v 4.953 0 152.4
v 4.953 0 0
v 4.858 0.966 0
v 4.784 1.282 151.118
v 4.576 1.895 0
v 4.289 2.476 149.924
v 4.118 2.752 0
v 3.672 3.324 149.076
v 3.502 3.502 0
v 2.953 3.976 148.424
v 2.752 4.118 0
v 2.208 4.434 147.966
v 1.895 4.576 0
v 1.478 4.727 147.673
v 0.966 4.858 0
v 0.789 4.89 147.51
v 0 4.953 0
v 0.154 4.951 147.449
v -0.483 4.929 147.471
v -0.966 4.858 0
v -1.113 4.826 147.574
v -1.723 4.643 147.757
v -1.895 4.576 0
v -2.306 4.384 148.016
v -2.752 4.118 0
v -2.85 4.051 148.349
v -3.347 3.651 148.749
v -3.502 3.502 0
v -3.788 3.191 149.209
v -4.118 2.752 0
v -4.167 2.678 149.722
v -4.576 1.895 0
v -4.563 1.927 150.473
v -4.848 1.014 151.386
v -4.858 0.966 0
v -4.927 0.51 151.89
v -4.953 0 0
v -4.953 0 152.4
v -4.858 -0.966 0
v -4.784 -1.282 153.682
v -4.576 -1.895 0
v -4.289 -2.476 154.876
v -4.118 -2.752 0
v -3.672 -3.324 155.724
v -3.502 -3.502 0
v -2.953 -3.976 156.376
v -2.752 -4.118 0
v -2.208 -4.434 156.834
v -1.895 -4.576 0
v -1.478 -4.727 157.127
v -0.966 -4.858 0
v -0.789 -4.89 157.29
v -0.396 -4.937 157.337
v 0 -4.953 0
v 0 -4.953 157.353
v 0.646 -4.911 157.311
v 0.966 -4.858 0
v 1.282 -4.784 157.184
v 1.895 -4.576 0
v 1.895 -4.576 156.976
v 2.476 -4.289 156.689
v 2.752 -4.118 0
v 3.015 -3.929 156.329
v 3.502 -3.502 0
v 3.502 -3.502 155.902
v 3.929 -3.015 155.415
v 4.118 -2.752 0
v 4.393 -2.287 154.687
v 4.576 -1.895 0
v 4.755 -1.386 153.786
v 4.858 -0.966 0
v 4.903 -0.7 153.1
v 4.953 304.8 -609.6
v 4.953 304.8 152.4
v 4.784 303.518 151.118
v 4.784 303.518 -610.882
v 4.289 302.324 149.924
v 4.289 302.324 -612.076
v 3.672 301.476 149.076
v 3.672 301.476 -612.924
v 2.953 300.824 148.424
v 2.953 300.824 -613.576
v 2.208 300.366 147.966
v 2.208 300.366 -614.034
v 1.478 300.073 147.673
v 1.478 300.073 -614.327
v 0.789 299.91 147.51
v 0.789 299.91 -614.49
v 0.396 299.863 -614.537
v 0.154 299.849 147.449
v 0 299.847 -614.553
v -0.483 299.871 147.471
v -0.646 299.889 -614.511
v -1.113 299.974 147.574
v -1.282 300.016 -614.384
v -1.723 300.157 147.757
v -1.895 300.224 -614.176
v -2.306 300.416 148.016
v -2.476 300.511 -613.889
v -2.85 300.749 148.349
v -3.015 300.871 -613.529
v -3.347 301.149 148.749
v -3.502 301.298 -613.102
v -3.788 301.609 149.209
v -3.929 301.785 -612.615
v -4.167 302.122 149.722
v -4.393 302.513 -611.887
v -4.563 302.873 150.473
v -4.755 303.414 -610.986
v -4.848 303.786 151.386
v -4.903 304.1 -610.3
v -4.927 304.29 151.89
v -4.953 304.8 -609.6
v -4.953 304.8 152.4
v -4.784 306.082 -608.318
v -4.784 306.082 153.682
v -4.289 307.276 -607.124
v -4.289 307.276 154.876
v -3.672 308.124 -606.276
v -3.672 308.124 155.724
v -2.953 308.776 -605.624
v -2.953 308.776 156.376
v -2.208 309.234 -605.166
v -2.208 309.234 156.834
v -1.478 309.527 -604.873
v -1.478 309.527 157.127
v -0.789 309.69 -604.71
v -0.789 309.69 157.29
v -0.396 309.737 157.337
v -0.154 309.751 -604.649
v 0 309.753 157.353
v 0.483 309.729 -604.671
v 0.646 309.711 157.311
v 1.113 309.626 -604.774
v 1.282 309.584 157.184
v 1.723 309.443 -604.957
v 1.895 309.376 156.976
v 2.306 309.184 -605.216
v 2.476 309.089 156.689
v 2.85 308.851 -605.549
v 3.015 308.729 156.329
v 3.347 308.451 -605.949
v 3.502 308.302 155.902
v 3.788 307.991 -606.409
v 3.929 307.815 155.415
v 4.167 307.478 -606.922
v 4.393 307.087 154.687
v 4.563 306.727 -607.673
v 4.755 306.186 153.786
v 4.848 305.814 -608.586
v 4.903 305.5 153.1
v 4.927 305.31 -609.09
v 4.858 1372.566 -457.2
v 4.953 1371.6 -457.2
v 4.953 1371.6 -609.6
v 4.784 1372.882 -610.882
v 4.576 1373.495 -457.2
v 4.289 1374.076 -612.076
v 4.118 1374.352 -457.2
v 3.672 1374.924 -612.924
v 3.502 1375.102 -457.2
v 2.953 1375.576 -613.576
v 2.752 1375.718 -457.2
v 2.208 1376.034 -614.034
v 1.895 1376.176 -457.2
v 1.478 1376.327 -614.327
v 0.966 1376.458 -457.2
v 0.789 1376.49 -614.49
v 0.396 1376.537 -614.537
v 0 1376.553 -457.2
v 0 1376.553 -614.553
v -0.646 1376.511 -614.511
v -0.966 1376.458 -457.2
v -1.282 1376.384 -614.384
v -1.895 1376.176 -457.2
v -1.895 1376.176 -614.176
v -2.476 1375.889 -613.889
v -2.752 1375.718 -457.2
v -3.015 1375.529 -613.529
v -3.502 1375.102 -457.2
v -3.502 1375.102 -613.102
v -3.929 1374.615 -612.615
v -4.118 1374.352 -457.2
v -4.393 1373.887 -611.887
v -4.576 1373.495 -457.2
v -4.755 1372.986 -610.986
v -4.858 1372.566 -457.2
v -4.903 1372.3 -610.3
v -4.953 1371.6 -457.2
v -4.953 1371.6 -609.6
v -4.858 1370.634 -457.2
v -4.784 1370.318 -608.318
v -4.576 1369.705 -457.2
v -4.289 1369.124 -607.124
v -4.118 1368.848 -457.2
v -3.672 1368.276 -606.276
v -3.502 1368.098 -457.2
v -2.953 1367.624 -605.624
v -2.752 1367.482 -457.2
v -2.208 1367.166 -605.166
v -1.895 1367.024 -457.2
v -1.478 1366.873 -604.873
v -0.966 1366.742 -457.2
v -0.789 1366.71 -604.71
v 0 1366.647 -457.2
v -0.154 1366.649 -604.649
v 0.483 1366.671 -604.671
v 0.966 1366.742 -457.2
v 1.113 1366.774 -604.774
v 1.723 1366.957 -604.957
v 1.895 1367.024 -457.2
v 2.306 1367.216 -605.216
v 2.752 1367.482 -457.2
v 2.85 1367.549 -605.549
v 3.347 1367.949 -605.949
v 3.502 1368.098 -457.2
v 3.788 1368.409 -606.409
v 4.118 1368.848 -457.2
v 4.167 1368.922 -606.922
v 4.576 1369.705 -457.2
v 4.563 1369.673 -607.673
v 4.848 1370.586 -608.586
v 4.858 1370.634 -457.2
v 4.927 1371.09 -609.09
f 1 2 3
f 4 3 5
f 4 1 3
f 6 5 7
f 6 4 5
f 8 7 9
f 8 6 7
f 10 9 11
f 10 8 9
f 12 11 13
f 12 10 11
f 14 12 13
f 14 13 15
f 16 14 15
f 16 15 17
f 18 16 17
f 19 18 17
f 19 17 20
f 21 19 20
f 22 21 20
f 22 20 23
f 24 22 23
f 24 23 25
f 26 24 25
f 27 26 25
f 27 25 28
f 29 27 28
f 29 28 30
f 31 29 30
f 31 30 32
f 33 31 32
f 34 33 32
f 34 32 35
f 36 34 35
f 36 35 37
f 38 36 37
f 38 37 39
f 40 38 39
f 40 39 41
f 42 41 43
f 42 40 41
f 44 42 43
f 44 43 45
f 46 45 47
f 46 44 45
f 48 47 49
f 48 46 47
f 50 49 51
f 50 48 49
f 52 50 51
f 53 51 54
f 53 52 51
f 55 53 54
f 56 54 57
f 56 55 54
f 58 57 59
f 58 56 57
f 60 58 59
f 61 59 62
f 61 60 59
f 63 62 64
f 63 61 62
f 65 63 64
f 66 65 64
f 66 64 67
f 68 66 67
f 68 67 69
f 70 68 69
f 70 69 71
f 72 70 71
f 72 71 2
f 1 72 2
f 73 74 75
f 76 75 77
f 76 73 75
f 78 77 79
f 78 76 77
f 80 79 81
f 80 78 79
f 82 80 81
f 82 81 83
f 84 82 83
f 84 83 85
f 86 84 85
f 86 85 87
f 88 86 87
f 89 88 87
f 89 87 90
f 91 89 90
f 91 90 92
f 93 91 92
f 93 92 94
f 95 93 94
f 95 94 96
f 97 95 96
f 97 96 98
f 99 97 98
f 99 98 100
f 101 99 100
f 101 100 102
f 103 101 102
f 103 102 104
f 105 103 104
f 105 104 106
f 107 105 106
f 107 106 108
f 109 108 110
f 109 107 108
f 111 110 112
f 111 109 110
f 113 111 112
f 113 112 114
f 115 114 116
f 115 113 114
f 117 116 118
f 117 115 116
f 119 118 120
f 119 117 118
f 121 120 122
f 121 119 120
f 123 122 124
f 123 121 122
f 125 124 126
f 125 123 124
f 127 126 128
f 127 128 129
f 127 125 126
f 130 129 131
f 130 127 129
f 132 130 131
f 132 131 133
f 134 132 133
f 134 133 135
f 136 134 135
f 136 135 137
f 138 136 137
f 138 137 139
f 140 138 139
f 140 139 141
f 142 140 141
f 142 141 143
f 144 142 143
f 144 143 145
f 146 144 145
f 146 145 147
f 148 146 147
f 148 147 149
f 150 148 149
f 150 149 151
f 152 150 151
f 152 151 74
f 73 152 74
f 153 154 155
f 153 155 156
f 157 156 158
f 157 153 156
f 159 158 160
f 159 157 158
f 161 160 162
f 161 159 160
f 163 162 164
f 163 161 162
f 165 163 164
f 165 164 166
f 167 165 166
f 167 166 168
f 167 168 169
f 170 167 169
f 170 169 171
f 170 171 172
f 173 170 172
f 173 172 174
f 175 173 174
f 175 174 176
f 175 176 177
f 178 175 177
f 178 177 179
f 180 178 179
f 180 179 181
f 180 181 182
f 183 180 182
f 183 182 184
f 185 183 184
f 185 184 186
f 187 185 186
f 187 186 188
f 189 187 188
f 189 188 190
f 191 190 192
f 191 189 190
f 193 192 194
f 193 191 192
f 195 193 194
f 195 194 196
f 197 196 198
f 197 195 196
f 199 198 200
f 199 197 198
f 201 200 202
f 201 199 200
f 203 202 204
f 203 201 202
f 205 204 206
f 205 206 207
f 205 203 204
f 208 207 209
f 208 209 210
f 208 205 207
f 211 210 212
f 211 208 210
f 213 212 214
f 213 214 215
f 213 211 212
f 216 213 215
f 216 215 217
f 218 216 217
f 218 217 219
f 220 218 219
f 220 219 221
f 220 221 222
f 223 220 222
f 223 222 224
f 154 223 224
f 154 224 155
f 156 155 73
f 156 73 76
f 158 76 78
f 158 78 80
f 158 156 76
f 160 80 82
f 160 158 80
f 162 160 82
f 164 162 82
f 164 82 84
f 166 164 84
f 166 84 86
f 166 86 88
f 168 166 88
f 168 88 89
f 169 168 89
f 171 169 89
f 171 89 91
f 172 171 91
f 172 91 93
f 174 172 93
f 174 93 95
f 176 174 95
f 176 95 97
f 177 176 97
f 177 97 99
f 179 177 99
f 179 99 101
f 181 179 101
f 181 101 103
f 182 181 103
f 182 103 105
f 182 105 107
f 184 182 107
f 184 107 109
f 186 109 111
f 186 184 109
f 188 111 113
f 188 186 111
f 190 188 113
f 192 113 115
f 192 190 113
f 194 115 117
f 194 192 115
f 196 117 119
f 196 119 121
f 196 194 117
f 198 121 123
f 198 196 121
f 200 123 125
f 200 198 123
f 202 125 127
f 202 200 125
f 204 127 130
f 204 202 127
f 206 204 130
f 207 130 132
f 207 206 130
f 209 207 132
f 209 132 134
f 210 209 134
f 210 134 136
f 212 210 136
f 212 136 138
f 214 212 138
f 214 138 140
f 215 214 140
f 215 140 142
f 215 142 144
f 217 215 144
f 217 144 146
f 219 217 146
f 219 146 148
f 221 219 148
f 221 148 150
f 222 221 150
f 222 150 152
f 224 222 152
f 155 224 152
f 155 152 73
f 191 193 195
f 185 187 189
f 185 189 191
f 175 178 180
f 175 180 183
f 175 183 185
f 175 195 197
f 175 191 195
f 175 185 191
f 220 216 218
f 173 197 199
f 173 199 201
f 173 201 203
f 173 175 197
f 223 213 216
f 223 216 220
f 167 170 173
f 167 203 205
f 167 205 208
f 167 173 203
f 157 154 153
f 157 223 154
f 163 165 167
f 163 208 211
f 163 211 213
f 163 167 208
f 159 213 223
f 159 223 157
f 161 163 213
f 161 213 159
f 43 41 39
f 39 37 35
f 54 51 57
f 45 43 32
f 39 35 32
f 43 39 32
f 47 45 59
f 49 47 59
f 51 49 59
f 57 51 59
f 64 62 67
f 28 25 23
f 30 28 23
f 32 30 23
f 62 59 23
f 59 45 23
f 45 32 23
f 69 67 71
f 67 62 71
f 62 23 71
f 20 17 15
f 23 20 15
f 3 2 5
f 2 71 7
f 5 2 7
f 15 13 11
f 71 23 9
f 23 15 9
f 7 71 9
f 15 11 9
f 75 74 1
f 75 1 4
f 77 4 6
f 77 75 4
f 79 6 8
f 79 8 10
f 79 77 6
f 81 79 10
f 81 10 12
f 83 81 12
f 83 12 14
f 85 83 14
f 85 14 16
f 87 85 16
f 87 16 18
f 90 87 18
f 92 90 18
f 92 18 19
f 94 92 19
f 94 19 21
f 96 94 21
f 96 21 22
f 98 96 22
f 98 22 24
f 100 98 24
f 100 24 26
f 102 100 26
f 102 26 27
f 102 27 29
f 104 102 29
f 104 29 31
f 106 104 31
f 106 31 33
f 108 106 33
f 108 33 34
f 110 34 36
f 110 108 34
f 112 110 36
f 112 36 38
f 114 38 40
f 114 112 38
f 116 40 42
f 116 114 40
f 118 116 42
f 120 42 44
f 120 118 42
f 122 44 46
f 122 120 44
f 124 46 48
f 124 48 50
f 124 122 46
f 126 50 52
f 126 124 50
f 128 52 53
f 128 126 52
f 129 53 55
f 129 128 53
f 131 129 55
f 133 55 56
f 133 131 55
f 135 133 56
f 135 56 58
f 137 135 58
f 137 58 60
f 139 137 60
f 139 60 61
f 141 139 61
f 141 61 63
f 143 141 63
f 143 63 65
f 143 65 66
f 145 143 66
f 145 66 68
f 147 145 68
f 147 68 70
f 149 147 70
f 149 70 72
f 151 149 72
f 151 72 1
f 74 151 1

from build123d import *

# Parameters (mm, degrees)
F0_R = 4.953


with BuildPart() as f2:
    # F2: sweep along a path in F1
    with BuildLine(Plane.YZ) as f2_path:
        Line((0, 0), (0, 152.4))
        Line((0, 152.4), (304.8, 152.4))
        Line((304.8, 152.4), (304.8, -609.6))
        Line((304.8, -609.6), (1371.6, -609.6))
        Line((1371.6, -609.6), (1371.6, -457.2))
    # F0 (on Top) → F2 (sweep)
    with BuildSketch(Plane.XY):
        Circle(F0_R)
    sweep(path=f2_path.line, transition=Transition.RIGHT)


solid = f2.part
